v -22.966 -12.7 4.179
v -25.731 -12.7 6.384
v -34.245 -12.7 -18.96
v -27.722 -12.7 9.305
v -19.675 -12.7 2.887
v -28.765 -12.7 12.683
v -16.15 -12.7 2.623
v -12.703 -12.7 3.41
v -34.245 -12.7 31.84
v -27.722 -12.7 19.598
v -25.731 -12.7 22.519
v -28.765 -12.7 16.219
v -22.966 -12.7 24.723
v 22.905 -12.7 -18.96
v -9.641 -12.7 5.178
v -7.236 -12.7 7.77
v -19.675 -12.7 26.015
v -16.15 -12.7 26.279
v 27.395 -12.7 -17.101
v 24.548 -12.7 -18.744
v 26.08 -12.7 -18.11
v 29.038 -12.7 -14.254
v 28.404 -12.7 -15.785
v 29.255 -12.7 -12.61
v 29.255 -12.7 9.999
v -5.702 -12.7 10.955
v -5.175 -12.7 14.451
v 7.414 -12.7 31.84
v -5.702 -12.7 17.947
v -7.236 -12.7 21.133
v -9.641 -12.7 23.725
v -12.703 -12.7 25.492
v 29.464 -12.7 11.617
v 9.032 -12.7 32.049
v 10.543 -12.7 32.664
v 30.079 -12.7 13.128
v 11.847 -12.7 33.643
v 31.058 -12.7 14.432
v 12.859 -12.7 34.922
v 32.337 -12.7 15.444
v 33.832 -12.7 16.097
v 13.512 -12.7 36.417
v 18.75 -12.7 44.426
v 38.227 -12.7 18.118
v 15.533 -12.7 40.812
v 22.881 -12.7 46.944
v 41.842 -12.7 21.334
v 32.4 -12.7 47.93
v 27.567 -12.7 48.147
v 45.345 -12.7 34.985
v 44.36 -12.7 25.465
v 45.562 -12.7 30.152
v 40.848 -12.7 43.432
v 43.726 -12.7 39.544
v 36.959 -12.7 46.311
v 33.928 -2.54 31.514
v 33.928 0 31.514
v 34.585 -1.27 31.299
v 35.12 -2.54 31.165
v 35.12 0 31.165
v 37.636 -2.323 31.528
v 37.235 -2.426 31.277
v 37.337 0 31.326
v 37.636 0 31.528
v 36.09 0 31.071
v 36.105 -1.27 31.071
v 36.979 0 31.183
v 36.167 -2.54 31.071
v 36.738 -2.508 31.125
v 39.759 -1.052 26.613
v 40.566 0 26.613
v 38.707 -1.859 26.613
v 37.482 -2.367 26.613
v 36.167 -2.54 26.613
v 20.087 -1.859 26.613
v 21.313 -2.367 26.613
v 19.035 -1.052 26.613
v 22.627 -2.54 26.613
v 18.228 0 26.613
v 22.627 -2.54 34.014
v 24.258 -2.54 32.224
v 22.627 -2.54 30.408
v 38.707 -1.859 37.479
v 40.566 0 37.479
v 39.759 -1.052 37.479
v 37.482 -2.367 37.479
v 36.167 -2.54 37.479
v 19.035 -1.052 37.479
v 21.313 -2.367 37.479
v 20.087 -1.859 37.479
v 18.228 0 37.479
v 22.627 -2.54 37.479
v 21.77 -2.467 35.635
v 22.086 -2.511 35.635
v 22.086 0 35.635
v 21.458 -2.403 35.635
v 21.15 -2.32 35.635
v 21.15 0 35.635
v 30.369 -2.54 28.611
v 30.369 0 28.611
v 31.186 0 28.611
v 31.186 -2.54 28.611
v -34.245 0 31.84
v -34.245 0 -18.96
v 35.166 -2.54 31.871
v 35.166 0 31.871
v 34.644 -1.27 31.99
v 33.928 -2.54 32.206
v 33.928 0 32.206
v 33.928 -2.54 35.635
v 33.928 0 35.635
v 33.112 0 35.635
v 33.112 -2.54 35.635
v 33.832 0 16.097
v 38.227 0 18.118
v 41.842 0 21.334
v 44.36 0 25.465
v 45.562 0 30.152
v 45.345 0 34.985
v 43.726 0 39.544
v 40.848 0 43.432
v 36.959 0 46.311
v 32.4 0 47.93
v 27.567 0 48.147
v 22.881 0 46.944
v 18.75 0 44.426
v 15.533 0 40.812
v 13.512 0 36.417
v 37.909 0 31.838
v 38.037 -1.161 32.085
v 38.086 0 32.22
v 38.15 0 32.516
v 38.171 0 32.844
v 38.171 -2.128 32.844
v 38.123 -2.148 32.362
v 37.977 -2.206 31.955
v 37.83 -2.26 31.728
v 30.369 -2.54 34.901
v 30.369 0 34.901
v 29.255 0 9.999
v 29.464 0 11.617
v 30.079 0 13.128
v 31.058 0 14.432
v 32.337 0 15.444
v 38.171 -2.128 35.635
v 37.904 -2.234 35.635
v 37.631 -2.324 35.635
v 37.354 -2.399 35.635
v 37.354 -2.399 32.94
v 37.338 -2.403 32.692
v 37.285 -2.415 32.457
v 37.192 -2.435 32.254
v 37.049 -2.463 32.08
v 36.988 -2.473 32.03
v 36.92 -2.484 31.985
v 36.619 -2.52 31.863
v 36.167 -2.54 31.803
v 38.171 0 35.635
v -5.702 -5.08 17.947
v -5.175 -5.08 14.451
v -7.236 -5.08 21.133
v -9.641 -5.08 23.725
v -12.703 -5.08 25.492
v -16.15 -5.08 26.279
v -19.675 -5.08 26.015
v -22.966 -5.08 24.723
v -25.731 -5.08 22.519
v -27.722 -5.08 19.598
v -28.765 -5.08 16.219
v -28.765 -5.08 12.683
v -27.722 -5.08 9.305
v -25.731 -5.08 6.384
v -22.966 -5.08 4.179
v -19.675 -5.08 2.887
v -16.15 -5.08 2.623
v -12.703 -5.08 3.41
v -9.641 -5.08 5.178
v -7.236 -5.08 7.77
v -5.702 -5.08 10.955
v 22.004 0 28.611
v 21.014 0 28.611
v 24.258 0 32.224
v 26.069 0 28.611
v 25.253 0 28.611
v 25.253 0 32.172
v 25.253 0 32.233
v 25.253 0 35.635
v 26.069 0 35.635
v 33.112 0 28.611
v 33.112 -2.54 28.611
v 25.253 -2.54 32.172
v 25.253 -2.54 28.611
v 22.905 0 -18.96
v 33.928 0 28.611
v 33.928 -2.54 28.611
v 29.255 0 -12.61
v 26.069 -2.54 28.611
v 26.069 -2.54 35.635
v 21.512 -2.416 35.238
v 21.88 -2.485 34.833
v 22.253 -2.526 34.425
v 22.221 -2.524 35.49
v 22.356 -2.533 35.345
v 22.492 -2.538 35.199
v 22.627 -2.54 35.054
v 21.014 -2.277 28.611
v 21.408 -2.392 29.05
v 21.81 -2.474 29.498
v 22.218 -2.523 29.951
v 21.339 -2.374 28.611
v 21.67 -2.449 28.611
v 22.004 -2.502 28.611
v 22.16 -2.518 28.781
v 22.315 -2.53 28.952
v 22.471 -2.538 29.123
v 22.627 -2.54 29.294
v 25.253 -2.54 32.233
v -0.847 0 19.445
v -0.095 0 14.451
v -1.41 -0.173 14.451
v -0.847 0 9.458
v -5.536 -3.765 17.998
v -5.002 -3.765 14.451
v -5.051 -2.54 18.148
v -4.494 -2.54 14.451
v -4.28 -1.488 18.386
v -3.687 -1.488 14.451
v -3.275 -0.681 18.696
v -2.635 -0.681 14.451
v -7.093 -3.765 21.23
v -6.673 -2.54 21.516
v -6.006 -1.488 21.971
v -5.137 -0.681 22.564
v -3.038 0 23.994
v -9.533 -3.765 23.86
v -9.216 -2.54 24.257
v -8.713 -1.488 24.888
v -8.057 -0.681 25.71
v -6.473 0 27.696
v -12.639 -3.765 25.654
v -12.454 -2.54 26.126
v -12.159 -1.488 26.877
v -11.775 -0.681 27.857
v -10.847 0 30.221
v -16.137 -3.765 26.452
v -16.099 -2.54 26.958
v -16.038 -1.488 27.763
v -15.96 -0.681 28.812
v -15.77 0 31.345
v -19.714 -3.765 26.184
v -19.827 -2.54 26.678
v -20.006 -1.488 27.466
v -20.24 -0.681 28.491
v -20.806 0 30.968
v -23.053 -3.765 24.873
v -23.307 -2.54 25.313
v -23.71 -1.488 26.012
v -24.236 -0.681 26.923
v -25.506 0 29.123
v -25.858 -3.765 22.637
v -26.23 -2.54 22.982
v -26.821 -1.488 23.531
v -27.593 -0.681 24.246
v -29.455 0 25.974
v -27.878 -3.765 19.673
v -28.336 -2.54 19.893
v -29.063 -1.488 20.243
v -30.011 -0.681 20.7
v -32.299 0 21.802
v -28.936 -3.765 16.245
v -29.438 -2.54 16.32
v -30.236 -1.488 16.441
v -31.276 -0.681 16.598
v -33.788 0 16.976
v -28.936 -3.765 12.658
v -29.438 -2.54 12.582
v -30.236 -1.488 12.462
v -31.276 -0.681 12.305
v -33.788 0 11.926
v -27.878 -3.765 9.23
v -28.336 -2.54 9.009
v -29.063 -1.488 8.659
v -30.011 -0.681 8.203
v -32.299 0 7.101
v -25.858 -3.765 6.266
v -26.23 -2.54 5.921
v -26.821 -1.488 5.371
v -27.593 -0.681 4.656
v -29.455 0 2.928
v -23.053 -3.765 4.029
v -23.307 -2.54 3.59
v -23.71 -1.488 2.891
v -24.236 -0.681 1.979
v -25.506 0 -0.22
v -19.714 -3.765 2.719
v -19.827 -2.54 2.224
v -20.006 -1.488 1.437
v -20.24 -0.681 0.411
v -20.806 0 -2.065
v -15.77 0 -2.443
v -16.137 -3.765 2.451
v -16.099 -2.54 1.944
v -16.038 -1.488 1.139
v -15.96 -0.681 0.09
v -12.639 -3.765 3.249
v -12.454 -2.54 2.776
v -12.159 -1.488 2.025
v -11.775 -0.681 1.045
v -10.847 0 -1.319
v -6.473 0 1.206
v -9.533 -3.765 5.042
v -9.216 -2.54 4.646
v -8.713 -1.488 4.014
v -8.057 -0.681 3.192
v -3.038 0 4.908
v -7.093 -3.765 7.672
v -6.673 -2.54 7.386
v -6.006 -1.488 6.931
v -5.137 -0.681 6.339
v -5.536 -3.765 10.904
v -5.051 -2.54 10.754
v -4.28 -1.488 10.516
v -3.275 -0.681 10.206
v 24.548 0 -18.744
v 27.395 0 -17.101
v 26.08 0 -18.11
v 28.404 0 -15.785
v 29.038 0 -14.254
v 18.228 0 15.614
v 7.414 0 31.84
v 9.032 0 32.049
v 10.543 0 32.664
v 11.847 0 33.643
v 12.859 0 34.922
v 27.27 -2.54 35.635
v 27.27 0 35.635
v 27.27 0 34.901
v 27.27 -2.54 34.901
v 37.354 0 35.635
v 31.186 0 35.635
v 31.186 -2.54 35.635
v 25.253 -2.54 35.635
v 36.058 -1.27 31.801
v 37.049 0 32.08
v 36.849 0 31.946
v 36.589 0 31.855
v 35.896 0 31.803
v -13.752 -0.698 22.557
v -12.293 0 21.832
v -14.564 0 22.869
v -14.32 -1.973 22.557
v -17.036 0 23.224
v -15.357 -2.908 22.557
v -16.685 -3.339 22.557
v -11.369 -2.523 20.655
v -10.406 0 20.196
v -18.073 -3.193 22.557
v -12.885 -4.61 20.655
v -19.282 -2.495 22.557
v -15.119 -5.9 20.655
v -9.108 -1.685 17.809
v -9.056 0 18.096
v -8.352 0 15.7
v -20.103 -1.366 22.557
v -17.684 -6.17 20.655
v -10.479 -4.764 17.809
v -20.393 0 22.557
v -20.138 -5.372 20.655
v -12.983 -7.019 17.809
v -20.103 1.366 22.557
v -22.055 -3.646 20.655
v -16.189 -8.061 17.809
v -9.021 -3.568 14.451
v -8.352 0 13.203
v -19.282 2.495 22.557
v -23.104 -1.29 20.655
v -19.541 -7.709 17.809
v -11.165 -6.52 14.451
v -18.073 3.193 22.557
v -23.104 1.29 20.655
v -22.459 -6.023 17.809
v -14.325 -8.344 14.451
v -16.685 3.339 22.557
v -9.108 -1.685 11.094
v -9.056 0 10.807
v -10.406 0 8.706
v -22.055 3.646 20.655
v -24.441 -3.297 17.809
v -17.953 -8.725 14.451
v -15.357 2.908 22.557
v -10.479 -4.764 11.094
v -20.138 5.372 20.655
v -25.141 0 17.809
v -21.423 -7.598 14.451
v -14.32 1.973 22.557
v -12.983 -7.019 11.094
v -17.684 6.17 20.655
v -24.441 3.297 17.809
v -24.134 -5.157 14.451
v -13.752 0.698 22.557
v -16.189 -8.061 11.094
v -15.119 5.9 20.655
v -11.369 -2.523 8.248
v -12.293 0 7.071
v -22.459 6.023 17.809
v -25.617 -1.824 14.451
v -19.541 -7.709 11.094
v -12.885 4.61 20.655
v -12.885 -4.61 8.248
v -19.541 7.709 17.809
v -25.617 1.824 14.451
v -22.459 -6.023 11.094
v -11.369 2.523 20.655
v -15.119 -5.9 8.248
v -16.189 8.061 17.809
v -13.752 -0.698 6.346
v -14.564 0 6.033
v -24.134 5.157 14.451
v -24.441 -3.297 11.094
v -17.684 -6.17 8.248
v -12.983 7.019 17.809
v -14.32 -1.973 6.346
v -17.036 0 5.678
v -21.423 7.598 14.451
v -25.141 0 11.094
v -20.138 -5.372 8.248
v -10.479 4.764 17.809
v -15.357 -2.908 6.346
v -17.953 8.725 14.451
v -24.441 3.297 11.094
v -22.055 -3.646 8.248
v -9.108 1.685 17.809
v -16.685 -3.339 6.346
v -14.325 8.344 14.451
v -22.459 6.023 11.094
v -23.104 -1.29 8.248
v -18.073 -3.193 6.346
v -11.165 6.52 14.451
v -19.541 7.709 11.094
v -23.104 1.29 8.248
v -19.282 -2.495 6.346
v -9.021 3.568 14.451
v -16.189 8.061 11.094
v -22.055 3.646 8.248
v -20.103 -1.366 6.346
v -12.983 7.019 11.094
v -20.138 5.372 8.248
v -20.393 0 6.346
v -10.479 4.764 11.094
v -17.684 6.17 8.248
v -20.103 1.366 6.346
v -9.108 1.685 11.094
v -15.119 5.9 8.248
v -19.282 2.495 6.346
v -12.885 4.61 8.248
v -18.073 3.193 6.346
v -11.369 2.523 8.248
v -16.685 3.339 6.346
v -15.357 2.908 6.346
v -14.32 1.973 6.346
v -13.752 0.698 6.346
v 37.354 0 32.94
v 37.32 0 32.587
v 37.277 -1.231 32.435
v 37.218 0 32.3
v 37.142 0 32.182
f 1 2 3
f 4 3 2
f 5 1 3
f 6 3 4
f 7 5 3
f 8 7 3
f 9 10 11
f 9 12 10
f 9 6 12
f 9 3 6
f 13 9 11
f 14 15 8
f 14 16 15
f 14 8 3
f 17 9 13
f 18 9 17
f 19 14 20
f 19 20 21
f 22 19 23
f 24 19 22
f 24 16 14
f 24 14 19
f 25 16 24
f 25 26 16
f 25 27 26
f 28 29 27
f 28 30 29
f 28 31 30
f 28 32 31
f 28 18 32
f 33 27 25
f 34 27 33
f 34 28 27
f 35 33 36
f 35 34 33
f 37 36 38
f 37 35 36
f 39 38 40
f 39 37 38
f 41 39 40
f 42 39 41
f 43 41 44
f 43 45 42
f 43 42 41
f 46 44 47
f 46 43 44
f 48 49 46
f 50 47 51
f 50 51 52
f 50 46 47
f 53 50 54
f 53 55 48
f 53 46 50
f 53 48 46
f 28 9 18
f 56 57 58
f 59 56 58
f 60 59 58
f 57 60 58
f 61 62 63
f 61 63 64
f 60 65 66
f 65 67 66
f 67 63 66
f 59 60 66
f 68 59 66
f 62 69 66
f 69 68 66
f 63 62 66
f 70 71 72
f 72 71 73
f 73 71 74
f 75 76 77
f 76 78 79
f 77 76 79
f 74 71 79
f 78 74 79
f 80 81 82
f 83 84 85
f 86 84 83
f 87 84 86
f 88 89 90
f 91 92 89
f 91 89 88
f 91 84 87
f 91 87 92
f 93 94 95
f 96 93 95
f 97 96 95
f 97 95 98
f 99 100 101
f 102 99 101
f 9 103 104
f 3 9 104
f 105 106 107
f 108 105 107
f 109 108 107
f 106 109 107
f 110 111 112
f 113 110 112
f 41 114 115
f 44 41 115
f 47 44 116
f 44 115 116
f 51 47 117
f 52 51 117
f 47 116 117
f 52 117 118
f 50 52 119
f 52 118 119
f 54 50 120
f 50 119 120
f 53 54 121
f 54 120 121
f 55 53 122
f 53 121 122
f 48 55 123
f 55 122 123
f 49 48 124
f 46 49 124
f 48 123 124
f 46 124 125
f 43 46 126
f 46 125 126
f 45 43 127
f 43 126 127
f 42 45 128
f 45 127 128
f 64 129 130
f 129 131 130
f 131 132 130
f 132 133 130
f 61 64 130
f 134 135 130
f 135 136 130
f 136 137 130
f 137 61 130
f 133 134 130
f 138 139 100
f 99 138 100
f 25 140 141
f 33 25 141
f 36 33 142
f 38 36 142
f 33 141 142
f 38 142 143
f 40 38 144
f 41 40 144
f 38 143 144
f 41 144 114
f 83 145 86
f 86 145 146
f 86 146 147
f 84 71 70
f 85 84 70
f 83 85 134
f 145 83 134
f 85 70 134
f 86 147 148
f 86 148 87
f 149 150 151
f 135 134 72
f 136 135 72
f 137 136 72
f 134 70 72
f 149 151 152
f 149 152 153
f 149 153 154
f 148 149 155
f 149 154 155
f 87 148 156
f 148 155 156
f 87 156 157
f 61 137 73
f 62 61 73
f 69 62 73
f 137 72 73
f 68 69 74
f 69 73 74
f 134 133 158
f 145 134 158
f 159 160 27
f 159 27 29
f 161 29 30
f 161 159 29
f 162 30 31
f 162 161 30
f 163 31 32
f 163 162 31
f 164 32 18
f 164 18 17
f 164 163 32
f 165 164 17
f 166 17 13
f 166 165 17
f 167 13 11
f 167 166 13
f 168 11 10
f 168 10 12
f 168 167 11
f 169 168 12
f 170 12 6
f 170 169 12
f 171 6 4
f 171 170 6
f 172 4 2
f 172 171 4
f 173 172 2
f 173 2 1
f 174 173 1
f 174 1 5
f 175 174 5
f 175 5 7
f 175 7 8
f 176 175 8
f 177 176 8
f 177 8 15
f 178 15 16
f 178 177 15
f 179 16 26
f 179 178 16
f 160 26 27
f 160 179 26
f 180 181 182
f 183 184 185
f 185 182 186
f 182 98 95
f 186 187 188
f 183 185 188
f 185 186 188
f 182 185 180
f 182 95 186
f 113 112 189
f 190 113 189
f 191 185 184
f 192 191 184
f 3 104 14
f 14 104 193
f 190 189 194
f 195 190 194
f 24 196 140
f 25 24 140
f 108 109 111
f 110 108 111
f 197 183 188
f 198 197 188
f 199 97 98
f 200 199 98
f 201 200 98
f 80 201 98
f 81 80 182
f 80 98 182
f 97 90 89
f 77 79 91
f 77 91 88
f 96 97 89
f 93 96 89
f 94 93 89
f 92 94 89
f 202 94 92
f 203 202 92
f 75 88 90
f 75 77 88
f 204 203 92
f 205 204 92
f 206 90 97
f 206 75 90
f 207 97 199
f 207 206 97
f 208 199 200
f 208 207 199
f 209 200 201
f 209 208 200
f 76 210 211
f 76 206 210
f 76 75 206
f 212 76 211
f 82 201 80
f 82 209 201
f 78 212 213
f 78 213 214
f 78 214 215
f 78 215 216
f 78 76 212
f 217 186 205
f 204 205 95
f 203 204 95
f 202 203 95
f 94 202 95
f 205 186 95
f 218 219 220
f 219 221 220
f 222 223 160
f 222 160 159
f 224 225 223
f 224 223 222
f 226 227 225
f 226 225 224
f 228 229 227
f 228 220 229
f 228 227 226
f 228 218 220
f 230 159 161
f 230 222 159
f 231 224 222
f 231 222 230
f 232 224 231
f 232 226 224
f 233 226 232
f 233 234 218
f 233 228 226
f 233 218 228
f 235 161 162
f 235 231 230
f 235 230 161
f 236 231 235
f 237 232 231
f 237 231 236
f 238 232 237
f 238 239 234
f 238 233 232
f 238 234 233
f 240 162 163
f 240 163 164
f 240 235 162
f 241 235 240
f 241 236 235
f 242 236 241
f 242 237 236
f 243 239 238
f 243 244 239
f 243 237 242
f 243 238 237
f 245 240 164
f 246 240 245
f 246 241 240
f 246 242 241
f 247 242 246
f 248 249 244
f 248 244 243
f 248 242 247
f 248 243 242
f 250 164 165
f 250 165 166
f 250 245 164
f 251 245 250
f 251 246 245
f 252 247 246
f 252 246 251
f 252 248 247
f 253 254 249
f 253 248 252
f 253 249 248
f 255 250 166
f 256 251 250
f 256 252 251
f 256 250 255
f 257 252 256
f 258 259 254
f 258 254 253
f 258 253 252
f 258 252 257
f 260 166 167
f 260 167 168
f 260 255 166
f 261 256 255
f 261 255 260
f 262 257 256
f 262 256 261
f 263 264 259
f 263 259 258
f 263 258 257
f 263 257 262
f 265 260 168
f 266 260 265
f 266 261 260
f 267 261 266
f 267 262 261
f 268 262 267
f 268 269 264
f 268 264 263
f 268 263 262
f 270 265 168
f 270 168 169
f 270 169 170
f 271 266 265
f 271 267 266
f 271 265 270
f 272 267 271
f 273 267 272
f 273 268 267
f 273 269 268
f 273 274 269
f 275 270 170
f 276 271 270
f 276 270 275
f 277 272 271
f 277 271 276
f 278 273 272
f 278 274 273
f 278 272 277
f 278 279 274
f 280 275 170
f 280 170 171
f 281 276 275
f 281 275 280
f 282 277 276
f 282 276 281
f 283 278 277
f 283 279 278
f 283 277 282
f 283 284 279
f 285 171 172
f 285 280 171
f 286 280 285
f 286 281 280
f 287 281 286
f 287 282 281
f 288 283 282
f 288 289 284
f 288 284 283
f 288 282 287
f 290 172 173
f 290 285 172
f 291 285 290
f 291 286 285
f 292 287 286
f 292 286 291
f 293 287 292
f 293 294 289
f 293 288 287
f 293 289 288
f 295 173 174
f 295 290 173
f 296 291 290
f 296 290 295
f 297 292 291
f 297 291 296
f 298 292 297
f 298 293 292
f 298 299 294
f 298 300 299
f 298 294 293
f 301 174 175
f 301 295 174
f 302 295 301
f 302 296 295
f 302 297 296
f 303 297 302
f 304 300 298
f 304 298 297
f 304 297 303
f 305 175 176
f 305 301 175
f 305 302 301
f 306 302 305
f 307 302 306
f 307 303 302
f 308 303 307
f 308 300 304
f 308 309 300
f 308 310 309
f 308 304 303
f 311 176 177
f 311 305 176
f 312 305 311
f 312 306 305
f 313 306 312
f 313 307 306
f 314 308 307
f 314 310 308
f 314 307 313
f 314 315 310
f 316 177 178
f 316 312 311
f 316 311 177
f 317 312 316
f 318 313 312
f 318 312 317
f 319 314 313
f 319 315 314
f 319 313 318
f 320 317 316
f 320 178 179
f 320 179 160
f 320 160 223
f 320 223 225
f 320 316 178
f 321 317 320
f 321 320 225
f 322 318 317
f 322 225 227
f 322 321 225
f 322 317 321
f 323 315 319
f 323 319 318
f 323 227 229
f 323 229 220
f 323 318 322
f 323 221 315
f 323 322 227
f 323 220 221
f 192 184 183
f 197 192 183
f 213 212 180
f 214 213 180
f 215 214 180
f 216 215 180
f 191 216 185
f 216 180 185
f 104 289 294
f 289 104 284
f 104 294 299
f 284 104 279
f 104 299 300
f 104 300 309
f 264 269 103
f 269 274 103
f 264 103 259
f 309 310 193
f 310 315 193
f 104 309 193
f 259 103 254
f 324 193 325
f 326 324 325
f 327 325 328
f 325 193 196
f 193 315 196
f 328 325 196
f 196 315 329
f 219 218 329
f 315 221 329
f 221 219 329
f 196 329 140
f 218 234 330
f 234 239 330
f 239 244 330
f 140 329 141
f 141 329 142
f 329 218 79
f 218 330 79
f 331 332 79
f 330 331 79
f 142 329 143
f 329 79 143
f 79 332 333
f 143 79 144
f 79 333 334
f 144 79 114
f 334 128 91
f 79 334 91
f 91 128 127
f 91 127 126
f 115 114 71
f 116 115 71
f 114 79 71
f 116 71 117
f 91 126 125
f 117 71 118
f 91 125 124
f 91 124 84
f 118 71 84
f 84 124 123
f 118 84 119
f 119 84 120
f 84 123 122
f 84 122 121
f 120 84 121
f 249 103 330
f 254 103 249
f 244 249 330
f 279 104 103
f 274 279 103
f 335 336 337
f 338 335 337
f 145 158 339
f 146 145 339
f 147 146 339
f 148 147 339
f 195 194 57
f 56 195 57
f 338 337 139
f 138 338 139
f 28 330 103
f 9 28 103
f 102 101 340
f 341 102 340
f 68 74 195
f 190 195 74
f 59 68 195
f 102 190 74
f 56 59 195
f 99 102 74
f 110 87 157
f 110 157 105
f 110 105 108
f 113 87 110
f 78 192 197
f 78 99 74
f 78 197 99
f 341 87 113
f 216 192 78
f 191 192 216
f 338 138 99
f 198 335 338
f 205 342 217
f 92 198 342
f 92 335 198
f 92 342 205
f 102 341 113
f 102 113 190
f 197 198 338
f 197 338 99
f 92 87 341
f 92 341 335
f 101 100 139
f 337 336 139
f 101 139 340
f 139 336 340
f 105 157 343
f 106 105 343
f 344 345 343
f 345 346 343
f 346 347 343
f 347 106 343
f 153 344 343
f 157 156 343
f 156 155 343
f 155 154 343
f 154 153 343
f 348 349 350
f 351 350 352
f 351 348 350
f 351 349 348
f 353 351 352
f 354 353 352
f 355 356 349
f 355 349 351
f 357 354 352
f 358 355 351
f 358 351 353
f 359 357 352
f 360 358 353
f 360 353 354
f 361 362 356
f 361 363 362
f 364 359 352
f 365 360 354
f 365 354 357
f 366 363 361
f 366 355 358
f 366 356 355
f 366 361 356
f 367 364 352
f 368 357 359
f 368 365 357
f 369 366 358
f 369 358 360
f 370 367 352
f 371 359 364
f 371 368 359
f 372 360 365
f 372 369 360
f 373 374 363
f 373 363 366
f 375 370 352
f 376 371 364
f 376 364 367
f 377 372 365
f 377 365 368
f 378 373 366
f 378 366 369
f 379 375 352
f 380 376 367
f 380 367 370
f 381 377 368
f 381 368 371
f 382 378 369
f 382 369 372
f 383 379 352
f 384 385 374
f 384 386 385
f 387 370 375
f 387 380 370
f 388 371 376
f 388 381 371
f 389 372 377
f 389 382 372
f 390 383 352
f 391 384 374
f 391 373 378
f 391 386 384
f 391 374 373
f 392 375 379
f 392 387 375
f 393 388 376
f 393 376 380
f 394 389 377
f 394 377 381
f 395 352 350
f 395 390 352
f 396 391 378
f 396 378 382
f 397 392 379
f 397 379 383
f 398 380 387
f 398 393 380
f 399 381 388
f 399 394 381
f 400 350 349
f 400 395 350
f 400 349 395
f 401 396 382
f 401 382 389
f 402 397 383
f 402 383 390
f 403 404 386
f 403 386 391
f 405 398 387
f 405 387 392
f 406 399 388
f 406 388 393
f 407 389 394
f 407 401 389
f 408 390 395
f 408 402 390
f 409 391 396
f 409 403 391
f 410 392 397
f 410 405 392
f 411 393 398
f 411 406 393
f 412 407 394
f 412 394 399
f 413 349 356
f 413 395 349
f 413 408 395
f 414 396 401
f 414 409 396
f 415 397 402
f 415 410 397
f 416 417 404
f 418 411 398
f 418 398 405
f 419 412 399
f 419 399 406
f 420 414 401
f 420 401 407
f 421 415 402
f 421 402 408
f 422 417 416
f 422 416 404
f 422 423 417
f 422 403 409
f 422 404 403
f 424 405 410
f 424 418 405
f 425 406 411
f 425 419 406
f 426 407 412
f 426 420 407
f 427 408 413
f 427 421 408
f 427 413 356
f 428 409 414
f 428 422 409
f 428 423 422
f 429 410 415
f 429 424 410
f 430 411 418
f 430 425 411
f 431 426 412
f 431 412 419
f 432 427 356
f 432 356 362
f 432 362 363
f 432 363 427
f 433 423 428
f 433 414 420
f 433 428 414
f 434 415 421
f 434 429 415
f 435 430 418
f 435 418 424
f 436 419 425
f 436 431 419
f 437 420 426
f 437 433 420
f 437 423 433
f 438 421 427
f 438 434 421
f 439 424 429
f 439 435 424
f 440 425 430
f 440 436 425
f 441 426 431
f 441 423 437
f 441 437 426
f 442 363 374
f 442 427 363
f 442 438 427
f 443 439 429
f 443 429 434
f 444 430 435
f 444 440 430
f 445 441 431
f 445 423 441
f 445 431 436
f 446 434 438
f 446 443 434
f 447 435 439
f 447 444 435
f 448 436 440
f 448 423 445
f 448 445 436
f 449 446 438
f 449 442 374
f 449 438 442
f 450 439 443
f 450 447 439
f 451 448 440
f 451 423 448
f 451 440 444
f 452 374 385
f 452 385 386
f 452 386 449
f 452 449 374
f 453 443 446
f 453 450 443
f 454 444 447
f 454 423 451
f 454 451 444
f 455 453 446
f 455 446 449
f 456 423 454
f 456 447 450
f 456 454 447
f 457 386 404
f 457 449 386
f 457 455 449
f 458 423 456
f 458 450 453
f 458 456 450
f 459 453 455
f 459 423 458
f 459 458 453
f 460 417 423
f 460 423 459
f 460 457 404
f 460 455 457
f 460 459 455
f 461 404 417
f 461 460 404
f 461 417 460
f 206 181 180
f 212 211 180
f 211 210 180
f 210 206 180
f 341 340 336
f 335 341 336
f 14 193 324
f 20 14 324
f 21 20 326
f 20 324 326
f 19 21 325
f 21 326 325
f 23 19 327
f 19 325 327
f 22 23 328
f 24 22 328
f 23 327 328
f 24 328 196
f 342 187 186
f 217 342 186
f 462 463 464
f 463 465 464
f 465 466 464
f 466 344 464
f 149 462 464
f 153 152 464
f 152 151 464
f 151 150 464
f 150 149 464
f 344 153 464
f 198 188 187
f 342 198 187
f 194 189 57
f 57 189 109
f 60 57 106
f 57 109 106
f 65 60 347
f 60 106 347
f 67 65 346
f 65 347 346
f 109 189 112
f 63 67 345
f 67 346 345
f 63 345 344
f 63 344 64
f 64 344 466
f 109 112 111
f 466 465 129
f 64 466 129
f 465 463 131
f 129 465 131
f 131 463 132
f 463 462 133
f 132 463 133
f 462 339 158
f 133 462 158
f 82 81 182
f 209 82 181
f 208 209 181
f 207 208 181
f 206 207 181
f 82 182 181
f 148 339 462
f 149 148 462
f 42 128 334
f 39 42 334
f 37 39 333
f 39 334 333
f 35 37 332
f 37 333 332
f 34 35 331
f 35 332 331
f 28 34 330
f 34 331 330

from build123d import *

# Parameters (mm, degrees)
F0_R        = 11.8611520112
F1_DEPTH    = 12.7
F4_R        = 5.08
F5_W        = 22.3380420357
F5_H        = 10.8657181263
F6_DEPTH    = 2.54
F7_T1_DEPTH = 21.8642407544
F8_T1_DEPTH = 10.8657181263


# Not quite as in the source:
# - a fillet or chamfer that OpenCascade refuses, or shapes differently, is made with other operations: its cross-section is extruded or revolved along the edge and cut away or added


with BuildPart() as f1:
    # F0 (on Front) → F1 (new body)
    with BuildSketch(Plane.XZ):
        with BuildLine():
            Line((7.4144873275, 31.8395160139), (-34.2452449948, 31.8395160139))
            Line((-34.2452449948, 31.8395160139), (-34.2452449948, -18.9604839861))
            Line((-34.2452449948, -18.9604839861), (22.9047550052, -18.9604839861))
            ThreePointArc((22.9047550052, -18.9604839861), (27.3948830658, -17.1006120467), (29.2547550052, -12.6104839861))
            Line((29.2547550052, -12.6104839861), (29.2547550052, 9.9992483361))
            ThreePointArc((29.2547550052, 9.9992483361), (30.5263698523, 13.8114005154), (33.8319216944, 16.0967529119))
            ThreePointArc((33.8319216944, 16.0967529119), (40.8475338995, 43.4322949081), (13.5119919033, 36.416682703))
            ThreePointArc((13.5119919033, 36.416682703), (11.2266395068, 33.1111308609), (7.4144873275, 31.8395160139))
        make_face()
        with Locations((-17.0359034091, 14.4511451945)):
            Circle(F0_R, mode=Mode.SUBTRACT)
    extrude(amount=F1_DEPTH)

    # F4
    f4_edges = [f1.edges().sort_by_distance(p)[0] for p in [
        (-28.897055, 0, 14.451145),
    ]]
    fillet(f4_edges, radius=F4_R)

    # F5 (on face) → F6 (cut)
    with BuildSketch(Plane(origin=(0, 0, 0), x_dir=(-1, 0, 0), z_dir=(0, 1, 0))):
        with Locations((-29.3970992789, 32.0457555354)):
            Rectangle(F5_W, F5_H)
        with BuildLine():
            Line((-33.1119049952, 35.6353998723), (-33.1119049952, 28.6111626774))
            Line((-33.1119049952, 28.6111626774), (-33.9282477289, 28.6111626774))
            Line((-33.9282477289, 28.6111626774), (-33.9282477289, 31.5137146196))
            add(Edge.make_bspline(
                [(-33.9282477289, 31.5137146196), (-34.6446615028, 31.2585114298), (-35.1204770886, 31.1647319443)],
                knots=[0, 0, 0, 1, 1, 1], degree=2))
            add(Edge.make_bspline(
                [(-35.1204770886, 31.1647319443), (-35.5962926745, 31.0709524589), (-36.1051616856, 31.0709524589)],
                knots=[0, 0, 0, 1, 1, 1], degree=2))
            add(Edge.make_bspline(
                [(-36.1051616856, 31.0709524589), (-37.0998391785, 31.0709524589), (-37.6356121402, 31.5275509371)],
                knots=[0, 0, 0, 1, 1, 1], degree=2))
            add(Edge.make_bspline(
                [(-37.6356121402, 31.5275509371), (-38.171385102, 31.9841494153), (-38.171385102, 32.8435384702)],
                knots=[0, 0, 0, 1, 1, 1], degree=2))
            Line((-38.171385102, 32.8435384702), (-38.171385102, 35.6353998723))
            Line((-38.171385102, 35.6353998723), (-37.3535049997, 35.6353998723))
            Line((-37.3535049997, 35.6353998723), (-37.3535049997, 32.9403926929))
            add(Edge.make_bspline(
                [(-37.3535049997, 32.9403926929), (-37.3535049997, 32.359267357), (-37.0491060142, 32.0802349537)],
                knots=[0, 0, 0, 1, 1, 1], degree=2))
            add(Edge.make_bspline(
                [(-37.0491060142, 32.0802349537), (-36.7447070287, 31.8012025503), (-36.0575032585, 31.8012025503)],
                knots=[0, 0, 0, 1, 1, 1], degree=2))
            add(Edge.make_bspline(
                [(-36.0575032585, 31.8012025503), (-35.5916805687, 31.8012025503), (-35.1658294627, 31.8711528222)],
                knots=[0, 0, 0, 1, 1, 1], degree=2))
            add(Edge.make_bspline(
                [(-35.1658294627, 31.8711528222), (-34.7399783568, 31.9411030941), (-33.9282477289, 32.2055304957)],
                knots=[0, 0, 0, 1, 1, 1], degree=2))
            Line((-33.9282477289, 32.2055304957), (-33.9282477289, 35.6353998723))
            Line((-33.9282477289, 35.6353998723), (-33.1119049952, 35.6353998723))
        make_face(mode=Mode.SUBTRACT)
        Polygon((-31.1855821225, 35.6353998723), (-27.2699042641, 35.6353998723), (-27.2699042641, 34.900537675), (-30.3692393888, 34.900537675), (-30.3692393888, 28.6111626774), (-31.1855821225, 28.6111626774), align=None, mode=Mode.SUBTRACT)
        Polygon((-24.2581991503, 32.223978919), (-21.0143513759, 28.6111626774), (-22.004416763, 28.6111626774), (-25.2528766432, 32.1717083862), (-25.2528766432, 28.6111626774), (-26.0692193769, 28.6111626774), (-26.0692193769, 35.6353998723), (-25.2528766432, 35.6353998723), (-25.2528766432, 32.2332031307), (-22.0858972995, 35.6353998723), (-21.1496398139, 35.6353998723), align=None, mode=Mode.SUBTRACT)
    extrude(amount=-F6_DEPTH, mode=Mode.SUBTRACT)

    # F7: fillet of radius 5.08 on 1 edges, made by hand

    # F7_s2 → F7_t1 (join)
    with BuildSketch(Plane.XY.offset(15.6143738442)):
        with BuildLine():
            ThreePointArc((18.228078261, 0), (20.0874873122, -1.8594090512), (22.6274873122, -2.54))
            Line((22.6274873122, -2.54), (18.228078261, -2.54))
            Line((18.228078261, -2.54), (18.228078261, 0))
        make_face()
    extrude(amount=F7_T1_DEPTH)

    # F8: fillet of radius 5.08 on 1 edges, made by hand

    # F8_s2 → F8_t1 (join)
    with BuildSketch(Plane.XY.offset(26.6128964722)):
        with BuildLine():
            ThreePointArc((40.5661202967, 0), (38.7067112455, -1.8594090512), (36.1667112455, -2.54))
            Line((36.1667112455, -2.54), (40.5661202967, -2.54))
            Line((40.5661202967, -2.54), (40.5661202967, 0))
        make_face()
    extrude(amount=F8_T1_DEPTH)


with BuildPart() as f3:
    # F2 (on face) → F3 (revolve)
    with BuildSketch(Plane(origin=(0, 0, 0), x_dir=(-1, 0, 0), z_dir=(0, 1, 0))):
        with BuildLine():
            Line((17.0359034091, 14.4511451945), (17.0359034091, 23.2243563161))
            ThreePointArc((17.0359034091, 23.2243563161), (8.2626922875, 14.4511451945), (17.0359034091, 5.6779340729))
            Line((17.0359034091, 5.6779340729), (17.0359034091, 14.4511451945))
        make_face()
    revolve(axis=Axis((-17.0359034091, 0, 14.4511451945), (0, 0, -1)))


solid = Compound([f1.part, f3.part])
